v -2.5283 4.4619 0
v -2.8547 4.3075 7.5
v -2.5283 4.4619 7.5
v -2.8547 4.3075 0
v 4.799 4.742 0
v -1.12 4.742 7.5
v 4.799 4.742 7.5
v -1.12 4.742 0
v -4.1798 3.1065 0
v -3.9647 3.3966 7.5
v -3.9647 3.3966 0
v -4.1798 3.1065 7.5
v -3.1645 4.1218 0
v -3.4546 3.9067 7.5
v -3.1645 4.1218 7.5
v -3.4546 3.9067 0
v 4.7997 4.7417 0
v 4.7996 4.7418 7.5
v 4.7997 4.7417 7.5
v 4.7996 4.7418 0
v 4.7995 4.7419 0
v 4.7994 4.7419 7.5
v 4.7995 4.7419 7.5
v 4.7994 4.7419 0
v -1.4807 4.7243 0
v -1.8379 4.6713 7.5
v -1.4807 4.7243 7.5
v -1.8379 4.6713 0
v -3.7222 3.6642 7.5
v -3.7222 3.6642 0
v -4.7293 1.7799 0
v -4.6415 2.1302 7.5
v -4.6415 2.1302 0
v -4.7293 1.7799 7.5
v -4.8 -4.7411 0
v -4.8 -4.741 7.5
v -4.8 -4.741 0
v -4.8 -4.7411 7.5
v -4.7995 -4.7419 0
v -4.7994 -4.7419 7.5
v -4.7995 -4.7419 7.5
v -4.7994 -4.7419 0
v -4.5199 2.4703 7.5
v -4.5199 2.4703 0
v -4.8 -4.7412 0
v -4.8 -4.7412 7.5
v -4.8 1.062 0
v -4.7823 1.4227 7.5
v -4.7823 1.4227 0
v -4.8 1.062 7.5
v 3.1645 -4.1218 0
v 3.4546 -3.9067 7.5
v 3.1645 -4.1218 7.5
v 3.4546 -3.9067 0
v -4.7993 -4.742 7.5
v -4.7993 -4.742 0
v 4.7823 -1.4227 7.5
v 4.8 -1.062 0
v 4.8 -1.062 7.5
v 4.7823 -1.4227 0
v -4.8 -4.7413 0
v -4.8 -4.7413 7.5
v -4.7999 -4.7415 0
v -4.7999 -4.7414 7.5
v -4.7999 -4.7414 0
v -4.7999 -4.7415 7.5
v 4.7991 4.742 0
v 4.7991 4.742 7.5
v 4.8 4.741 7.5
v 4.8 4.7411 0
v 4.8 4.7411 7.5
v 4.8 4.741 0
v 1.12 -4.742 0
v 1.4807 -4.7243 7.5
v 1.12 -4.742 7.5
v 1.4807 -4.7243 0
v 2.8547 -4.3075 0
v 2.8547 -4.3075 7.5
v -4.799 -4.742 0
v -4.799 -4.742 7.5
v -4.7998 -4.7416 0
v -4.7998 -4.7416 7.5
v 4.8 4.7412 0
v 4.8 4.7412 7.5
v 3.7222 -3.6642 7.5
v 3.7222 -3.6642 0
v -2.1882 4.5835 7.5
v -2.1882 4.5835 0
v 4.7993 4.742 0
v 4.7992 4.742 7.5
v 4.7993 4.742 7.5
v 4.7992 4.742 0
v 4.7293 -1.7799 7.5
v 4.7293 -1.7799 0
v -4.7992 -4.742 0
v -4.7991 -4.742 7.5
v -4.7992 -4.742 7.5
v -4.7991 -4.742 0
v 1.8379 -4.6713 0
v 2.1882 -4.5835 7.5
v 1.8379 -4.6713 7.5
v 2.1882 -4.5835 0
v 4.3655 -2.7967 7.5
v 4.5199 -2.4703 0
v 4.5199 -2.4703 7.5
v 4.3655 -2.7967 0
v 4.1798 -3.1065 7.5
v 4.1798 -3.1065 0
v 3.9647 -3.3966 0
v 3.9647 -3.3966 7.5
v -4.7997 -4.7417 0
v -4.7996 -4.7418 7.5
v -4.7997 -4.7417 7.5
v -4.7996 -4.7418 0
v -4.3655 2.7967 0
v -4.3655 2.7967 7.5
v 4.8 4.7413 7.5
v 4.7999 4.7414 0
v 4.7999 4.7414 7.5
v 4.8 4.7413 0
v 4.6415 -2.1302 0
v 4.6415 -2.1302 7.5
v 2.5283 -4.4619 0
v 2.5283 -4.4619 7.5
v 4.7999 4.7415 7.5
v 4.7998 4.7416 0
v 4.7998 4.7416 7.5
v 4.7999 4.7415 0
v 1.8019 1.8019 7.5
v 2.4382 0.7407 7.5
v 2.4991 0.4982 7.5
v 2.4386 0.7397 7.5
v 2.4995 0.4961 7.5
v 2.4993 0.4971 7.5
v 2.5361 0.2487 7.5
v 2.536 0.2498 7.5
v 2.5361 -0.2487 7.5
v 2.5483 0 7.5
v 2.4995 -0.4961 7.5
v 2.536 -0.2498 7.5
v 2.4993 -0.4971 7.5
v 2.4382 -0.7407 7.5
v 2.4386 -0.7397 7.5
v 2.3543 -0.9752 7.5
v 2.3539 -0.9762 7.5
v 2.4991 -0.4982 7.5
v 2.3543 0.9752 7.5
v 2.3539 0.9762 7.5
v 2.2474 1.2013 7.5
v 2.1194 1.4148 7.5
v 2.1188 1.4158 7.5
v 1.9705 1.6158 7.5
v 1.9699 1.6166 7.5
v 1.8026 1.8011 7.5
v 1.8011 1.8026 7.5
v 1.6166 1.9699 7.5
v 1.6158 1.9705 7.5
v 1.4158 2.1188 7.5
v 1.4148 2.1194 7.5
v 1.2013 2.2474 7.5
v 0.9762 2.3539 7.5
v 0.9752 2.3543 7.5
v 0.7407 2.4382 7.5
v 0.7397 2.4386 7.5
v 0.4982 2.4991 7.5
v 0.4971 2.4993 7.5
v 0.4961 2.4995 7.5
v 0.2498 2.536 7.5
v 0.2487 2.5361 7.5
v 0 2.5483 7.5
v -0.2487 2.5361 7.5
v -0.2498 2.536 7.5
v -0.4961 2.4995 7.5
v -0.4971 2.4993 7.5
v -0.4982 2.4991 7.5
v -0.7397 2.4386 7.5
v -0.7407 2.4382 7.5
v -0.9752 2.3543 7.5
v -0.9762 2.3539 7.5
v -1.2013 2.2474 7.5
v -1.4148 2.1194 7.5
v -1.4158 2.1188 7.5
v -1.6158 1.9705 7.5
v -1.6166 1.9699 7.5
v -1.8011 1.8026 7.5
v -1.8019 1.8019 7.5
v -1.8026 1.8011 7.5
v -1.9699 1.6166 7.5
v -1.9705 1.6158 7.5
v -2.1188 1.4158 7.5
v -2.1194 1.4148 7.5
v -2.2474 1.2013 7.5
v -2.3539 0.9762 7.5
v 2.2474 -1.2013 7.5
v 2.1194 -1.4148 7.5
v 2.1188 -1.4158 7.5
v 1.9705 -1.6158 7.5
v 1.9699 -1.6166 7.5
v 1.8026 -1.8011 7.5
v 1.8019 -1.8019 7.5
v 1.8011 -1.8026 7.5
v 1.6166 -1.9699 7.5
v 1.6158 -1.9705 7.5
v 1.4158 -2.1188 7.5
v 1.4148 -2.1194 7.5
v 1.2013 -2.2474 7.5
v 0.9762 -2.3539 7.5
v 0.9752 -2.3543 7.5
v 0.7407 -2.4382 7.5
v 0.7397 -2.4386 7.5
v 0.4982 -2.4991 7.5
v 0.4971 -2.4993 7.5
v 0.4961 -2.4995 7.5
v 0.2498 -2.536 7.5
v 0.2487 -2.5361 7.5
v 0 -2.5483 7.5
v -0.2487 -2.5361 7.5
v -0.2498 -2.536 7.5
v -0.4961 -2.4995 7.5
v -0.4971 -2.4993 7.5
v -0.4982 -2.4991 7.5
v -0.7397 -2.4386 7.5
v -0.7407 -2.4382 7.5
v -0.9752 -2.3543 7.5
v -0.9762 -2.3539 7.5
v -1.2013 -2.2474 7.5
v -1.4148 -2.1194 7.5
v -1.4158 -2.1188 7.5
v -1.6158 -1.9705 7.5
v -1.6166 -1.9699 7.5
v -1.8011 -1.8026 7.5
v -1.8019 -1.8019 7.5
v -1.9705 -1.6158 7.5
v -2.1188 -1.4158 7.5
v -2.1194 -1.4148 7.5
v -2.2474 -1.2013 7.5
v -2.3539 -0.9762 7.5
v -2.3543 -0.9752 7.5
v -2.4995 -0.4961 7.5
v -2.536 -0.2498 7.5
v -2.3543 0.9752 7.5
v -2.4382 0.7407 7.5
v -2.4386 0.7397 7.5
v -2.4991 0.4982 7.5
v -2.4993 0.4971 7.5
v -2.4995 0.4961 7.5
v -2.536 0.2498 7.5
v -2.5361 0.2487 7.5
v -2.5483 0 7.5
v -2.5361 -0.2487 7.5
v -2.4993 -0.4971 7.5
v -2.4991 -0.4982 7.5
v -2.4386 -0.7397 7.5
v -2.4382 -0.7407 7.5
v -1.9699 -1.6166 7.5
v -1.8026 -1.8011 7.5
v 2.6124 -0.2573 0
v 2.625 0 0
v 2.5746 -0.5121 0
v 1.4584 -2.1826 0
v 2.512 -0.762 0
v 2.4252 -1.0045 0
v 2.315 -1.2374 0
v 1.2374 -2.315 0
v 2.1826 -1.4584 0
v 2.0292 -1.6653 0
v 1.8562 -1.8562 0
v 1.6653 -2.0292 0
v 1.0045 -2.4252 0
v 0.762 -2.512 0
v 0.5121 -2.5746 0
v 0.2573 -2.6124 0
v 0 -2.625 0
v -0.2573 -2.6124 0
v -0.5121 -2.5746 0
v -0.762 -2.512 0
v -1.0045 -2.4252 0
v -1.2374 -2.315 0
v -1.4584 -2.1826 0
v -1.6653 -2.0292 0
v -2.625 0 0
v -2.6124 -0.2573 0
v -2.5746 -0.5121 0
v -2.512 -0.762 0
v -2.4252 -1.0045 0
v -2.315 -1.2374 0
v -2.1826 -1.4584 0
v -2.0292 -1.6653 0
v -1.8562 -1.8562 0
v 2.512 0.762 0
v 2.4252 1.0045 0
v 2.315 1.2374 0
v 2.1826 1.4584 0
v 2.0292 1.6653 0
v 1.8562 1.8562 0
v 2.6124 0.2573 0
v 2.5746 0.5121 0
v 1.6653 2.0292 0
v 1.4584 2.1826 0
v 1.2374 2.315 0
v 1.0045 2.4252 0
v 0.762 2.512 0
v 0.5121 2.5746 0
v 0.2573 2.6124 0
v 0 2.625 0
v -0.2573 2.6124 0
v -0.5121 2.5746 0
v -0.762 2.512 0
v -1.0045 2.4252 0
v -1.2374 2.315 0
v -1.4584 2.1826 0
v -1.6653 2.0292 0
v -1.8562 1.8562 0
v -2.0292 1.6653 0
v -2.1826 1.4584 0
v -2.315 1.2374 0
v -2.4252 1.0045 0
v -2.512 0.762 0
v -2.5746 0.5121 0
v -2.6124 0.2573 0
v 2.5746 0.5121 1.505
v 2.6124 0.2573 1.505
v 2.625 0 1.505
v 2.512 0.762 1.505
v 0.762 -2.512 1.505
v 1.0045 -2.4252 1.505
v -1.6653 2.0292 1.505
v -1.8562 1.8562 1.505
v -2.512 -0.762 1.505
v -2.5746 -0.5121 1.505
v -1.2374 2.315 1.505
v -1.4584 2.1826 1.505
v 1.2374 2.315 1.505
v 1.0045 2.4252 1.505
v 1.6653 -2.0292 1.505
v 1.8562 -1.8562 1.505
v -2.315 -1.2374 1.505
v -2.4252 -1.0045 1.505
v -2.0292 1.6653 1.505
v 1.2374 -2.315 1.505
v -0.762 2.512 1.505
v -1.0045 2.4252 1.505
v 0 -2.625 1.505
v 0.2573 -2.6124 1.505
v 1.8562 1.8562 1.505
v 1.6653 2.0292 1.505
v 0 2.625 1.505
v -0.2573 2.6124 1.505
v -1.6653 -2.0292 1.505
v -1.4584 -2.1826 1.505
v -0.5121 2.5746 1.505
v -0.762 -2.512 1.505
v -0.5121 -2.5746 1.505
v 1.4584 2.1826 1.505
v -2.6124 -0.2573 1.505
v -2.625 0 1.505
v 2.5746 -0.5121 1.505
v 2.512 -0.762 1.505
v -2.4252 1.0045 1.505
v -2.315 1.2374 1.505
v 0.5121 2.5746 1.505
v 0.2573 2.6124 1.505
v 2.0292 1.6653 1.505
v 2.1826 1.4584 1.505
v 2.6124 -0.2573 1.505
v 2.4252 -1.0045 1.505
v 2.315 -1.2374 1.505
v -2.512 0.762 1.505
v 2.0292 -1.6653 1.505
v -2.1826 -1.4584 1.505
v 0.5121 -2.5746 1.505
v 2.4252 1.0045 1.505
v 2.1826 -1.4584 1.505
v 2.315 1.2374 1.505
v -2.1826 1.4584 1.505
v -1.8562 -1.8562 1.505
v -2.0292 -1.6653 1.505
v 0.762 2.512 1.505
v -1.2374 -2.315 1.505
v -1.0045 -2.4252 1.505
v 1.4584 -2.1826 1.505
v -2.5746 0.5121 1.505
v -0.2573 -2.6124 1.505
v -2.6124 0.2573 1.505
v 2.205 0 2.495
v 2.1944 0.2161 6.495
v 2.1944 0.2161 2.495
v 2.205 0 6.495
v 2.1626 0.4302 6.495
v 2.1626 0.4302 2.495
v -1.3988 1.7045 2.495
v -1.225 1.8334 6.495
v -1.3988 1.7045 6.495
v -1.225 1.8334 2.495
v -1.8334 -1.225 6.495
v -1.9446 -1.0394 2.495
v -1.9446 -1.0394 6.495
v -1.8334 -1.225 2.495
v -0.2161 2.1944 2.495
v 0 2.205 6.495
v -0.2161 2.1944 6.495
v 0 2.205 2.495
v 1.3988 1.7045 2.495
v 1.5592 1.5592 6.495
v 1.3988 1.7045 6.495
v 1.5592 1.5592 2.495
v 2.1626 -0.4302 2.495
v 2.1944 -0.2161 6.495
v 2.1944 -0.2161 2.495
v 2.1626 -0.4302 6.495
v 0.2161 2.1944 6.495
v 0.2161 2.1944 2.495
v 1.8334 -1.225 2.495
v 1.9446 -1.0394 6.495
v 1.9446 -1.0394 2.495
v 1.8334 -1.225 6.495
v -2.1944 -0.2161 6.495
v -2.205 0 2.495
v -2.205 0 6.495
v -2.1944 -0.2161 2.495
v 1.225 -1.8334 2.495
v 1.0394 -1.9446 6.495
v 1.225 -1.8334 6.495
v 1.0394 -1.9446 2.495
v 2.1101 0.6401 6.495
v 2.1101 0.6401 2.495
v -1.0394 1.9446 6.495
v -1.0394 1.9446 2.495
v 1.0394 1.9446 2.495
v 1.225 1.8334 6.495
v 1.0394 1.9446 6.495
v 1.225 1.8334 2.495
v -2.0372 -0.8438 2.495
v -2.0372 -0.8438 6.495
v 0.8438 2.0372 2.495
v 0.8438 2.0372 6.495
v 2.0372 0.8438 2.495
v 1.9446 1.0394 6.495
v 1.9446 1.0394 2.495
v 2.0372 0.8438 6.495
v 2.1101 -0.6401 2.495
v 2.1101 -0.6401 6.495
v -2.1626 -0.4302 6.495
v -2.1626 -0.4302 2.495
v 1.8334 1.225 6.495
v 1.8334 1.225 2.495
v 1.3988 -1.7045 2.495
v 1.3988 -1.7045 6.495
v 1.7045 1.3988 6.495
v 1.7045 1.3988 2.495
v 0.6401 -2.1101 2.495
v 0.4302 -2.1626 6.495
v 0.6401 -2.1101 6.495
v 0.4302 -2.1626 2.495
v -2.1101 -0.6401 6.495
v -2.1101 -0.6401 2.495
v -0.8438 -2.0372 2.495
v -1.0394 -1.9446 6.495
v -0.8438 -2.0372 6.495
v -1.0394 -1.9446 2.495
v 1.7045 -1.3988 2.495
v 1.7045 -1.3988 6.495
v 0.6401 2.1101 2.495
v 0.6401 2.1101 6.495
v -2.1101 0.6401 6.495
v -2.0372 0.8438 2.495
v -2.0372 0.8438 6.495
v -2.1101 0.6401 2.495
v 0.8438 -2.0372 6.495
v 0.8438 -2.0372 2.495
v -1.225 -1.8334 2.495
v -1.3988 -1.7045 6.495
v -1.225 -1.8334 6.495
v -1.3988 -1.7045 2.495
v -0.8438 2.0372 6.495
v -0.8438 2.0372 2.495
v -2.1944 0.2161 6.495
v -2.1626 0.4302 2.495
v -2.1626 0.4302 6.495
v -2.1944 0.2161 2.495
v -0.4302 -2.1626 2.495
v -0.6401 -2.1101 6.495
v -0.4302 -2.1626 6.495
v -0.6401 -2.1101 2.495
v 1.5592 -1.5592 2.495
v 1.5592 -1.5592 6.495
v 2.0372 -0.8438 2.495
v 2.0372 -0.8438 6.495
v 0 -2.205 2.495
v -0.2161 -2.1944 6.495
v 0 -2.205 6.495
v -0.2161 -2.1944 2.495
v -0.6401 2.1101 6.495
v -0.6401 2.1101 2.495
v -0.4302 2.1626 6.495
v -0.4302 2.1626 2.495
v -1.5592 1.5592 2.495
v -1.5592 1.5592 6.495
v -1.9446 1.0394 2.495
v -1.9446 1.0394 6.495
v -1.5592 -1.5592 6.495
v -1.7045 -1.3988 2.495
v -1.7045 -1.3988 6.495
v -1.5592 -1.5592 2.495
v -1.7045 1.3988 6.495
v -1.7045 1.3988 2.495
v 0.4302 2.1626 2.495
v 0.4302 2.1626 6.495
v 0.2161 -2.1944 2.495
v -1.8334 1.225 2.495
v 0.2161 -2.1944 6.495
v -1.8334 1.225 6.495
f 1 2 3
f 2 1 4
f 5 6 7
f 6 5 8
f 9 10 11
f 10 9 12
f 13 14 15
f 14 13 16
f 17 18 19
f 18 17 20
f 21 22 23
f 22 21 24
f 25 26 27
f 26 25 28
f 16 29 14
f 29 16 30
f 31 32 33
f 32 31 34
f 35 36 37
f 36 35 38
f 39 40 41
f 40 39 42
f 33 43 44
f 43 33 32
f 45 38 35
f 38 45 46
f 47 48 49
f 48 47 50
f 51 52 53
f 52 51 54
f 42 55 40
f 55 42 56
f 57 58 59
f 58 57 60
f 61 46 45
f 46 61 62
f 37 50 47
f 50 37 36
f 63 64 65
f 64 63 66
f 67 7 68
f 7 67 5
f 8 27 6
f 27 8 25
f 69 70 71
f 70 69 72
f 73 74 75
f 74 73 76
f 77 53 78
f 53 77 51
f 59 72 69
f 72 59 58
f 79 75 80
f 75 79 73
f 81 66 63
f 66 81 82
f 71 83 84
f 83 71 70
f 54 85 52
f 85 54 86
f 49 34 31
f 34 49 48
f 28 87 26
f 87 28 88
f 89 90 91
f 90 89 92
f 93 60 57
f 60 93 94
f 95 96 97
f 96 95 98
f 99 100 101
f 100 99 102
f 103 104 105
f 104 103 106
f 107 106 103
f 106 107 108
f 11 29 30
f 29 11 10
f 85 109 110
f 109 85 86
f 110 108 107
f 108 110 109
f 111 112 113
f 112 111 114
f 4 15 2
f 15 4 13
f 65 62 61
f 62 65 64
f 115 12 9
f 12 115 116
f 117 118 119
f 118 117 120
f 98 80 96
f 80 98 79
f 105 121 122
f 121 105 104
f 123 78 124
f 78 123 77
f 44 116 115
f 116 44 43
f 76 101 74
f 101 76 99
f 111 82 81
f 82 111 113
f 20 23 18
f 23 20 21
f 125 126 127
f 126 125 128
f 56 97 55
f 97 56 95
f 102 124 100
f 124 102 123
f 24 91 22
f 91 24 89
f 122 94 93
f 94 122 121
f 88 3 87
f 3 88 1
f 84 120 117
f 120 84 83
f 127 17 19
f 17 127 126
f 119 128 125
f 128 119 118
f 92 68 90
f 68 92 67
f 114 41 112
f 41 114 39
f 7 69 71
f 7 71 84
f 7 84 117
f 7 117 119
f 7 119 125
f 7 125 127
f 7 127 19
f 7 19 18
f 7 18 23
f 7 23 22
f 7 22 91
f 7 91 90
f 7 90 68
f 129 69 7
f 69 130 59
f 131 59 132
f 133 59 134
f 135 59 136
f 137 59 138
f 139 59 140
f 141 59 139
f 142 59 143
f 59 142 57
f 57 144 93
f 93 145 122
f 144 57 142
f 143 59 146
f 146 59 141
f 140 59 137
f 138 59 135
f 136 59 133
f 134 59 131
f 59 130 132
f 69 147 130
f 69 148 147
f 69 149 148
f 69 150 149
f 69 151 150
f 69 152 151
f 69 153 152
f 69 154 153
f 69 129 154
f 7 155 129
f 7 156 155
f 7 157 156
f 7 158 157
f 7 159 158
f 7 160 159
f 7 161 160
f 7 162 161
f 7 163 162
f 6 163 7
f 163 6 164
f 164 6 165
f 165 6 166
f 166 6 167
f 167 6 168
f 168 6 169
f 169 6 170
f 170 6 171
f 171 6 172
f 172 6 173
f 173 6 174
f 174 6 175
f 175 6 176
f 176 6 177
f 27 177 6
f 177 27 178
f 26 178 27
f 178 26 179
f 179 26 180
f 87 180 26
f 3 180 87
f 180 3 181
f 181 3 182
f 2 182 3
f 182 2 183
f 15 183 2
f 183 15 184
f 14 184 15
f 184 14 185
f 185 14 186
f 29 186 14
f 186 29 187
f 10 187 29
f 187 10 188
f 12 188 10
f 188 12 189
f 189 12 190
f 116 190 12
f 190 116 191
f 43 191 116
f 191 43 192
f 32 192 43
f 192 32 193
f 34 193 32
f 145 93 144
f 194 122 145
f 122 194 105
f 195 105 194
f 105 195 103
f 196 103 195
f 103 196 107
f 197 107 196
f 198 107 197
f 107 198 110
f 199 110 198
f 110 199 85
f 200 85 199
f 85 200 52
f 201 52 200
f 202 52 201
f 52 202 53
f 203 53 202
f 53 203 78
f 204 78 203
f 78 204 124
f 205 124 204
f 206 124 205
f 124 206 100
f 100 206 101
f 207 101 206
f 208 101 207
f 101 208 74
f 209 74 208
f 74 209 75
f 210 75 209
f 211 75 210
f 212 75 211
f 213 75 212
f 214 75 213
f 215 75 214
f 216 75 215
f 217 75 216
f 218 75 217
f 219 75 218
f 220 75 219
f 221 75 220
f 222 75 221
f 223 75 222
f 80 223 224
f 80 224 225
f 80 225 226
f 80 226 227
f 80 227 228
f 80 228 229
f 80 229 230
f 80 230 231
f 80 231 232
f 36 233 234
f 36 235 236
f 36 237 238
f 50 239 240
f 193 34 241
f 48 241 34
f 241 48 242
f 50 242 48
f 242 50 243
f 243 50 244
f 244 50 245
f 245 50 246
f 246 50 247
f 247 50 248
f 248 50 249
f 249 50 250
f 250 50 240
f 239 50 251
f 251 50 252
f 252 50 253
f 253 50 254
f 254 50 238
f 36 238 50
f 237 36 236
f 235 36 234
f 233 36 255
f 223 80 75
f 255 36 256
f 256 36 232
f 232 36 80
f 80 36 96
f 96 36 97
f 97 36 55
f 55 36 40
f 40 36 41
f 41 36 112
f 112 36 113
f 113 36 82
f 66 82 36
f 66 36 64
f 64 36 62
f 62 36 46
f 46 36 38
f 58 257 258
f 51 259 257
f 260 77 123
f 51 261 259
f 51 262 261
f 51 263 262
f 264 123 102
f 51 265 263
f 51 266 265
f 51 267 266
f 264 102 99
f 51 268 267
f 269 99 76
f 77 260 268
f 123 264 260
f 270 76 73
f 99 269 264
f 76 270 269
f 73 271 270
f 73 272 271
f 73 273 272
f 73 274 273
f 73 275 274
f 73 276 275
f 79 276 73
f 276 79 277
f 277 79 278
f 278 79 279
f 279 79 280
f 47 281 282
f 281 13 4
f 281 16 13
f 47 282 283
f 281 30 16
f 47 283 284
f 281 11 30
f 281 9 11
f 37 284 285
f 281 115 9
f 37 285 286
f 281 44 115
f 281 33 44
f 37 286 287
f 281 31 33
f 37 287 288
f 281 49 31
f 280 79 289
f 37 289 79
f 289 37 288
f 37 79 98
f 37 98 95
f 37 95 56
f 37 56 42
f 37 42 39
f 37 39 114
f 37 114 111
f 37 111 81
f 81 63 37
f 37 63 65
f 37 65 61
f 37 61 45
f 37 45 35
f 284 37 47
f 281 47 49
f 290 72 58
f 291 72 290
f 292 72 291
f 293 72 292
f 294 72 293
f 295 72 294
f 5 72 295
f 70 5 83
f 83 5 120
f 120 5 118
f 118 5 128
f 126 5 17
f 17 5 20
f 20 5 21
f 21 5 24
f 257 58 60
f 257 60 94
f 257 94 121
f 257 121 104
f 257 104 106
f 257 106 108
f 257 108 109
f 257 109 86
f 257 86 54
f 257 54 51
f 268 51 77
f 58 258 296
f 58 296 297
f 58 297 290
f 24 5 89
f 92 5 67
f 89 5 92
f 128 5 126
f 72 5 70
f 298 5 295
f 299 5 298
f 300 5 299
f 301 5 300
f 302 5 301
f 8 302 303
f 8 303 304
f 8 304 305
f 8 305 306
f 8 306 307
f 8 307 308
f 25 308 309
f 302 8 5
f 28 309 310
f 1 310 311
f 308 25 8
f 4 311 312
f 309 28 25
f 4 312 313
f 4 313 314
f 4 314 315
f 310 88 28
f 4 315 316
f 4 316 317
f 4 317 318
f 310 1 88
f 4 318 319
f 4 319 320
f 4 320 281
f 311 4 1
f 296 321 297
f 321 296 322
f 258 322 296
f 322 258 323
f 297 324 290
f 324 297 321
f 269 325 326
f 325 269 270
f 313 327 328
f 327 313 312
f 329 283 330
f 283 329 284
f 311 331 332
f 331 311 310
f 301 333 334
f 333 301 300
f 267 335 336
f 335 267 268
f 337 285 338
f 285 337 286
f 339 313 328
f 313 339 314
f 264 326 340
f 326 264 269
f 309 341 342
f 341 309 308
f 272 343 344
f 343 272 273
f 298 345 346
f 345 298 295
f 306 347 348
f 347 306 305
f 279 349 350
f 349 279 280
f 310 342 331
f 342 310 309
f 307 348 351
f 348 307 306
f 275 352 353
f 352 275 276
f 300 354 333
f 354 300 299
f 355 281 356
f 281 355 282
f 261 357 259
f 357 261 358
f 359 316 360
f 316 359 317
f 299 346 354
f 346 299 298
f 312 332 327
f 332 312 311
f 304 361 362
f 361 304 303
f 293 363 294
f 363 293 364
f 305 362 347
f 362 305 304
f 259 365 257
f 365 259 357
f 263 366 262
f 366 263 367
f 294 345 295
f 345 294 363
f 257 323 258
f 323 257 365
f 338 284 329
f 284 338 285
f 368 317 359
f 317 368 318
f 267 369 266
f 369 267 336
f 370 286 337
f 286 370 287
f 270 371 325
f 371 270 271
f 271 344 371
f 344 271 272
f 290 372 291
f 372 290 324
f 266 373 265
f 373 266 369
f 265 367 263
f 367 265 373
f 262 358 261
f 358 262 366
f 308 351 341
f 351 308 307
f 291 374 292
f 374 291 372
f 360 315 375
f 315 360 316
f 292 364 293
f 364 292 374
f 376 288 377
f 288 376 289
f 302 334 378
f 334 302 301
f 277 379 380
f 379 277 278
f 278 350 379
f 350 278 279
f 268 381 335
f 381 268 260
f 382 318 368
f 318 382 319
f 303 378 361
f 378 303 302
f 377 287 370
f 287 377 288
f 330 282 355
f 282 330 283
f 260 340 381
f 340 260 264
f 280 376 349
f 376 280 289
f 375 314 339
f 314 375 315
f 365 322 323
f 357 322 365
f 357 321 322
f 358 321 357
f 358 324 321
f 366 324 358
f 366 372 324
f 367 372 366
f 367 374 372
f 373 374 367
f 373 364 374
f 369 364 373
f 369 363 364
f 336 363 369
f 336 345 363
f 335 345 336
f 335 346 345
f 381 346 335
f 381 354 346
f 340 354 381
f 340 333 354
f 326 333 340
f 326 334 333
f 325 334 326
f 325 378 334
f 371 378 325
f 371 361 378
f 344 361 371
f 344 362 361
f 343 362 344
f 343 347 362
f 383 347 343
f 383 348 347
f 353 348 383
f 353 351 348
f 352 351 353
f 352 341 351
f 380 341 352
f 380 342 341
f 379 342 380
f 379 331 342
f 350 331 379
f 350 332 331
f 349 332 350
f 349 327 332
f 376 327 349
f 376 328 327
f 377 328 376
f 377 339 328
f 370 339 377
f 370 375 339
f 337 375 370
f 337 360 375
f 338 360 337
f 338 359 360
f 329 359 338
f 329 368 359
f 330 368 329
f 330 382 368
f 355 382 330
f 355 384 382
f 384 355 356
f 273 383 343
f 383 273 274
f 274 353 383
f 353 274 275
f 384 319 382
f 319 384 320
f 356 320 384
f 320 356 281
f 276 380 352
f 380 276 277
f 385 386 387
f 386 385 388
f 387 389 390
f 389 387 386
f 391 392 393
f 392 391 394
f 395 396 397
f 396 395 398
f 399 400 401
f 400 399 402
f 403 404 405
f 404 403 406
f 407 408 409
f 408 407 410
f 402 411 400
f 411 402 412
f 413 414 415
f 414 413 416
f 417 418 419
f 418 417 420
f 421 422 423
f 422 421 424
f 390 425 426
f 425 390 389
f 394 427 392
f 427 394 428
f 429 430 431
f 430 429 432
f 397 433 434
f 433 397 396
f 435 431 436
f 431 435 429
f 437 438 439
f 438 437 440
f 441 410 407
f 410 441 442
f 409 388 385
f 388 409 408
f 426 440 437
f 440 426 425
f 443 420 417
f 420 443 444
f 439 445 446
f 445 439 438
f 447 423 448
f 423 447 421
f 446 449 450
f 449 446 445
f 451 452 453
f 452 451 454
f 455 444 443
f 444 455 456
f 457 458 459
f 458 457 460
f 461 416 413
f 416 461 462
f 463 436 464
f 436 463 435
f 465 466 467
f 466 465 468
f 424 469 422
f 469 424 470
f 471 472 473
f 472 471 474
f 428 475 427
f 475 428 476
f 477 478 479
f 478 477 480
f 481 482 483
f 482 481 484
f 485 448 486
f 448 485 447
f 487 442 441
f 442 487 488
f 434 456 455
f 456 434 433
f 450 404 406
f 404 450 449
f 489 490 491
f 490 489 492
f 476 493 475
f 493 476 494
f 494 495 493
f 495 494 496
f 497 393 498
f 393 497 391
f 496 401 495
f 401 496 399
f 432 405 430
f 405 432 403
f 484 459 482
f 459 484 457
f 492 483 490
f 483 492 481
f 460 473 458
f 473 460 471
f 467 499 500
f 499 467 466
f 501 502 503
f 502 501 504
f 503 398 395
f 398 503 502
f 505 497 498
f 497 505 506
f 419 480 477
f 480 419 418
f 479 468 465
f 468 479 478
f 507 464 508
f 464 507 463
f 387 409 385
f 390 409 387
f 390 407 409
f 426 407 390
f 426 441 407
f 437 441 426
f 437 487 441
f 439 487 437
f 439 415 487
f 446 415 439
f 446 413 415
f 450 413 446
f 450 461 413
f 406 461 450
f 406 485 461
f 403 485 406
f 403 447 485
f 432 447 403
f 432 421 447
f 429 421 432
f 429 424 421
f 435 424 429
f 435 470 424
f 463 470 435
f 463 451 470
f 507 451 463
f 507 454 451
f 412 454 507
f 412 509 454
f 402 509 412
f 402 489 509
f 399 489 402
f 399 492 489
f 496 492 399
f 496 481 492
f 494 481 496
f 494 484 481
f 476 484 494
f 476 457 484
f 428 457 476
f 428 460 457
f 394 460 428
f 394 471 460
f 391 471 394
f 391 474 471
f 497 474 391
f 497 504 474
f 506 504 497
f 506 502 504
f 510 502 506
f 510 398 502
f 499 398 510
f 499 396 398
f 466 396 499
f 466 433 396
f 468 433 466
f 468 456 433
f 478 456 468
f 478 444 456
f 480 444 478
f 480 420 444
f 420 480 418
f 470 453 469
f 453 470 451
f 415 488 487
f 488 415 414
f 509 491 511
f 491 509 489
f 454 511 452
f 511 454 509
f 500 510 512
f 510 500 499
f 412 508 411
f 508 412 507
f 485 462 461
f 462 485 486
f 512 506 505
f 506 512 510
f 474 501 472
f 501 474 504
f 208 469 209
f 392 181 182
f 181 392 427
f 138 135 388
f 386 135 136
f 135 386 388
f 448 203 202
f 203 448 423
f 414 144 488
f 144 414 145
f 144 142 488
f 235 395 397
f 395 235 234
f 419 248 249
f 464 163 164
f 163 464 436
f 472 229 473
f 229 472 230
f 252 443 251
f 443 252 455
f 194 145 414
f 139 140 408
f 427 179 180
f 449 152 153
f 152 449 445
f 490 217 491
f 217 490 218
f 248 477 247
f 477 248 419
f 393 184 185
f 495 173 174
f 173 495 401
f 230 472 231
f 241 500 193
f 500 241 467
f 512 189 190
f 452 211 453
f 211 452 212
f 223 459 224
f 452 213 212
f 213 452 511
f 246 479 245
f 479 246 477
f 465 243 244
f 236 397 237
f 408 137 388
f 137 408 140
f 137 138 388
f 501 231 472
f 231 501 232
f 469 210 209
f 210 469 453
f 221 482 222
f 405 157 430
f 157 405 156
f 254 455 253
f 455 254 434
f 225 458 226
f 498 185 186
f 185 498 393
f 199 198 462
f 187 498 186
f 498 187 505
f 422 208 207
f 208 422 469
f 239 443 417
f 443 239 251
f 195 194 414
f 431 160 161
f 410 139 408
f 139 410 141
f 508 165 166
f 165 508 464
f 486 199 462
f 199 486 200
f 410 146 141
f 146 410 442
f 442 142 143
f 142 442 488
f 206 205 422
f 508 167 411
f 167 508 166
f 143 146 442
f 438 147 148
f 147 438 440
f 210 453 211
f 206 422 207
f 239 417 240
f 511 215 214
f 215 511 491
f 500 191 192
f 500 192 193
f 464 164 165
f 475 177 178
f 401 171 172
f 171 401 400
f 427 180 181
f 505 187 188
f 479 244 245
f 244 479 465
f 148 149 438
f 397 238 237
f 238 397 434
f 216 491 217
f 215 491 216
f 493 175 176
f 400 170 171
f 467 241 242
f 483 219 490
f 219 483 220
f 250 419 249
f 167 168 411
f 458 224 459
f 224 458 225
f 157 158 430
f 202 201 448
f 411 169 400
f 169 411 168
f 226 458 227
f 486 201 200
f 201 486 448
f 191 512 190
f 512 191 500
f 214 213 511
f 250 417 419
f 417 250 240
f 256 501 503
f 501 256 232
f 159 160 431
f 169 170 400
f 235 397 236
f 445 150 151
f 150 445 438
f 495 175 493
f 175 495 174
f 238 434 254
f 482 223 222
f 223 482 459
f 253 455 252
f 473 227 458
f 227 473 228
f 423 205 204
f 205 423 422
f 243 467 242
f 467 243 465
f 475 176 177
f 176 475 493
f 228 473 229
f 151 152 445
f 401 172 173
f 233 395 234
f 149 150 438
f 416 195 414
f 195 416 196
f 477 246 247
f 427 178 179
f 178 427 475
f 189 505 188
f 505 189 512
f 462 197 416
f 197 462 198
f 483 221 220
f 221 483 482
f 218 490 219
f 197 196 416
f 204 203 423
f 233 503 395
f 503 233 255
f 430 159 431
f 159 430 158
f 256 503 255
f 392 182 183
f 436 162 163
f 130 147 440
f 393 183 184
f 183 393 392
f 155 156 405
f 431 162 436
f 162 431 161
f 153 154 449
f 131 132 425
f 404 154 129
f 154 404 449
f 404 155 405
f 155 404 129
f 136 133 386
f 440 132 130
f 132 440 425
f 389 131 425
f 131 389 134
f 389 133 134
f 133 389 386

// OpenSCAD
$fn=64;

difference() {
    linear_extrude(height=7.5) {
        hull() {
            translate([-1.12, 1.062, 0]) circle(r=3.68);
            translate([1.12, -1.062, 0]) circle(r=3.68);
            translate([4.799, 4.741, 0]) circle(r=0.001);
            translate([-4.799, -4.741, 0]) circle(r=0.001);
        }
    }
    
    translate([0,0,0.75]) cylinder(h=1.51, r=2.625, center=true);
    
    translate([0,0,5]) cylinder(h=5.01, d=4.41, center=true);
    
    translate([0,0,7]) cylinder(h=1.01, d1=4.41, d2=5.1, center=true);
}
